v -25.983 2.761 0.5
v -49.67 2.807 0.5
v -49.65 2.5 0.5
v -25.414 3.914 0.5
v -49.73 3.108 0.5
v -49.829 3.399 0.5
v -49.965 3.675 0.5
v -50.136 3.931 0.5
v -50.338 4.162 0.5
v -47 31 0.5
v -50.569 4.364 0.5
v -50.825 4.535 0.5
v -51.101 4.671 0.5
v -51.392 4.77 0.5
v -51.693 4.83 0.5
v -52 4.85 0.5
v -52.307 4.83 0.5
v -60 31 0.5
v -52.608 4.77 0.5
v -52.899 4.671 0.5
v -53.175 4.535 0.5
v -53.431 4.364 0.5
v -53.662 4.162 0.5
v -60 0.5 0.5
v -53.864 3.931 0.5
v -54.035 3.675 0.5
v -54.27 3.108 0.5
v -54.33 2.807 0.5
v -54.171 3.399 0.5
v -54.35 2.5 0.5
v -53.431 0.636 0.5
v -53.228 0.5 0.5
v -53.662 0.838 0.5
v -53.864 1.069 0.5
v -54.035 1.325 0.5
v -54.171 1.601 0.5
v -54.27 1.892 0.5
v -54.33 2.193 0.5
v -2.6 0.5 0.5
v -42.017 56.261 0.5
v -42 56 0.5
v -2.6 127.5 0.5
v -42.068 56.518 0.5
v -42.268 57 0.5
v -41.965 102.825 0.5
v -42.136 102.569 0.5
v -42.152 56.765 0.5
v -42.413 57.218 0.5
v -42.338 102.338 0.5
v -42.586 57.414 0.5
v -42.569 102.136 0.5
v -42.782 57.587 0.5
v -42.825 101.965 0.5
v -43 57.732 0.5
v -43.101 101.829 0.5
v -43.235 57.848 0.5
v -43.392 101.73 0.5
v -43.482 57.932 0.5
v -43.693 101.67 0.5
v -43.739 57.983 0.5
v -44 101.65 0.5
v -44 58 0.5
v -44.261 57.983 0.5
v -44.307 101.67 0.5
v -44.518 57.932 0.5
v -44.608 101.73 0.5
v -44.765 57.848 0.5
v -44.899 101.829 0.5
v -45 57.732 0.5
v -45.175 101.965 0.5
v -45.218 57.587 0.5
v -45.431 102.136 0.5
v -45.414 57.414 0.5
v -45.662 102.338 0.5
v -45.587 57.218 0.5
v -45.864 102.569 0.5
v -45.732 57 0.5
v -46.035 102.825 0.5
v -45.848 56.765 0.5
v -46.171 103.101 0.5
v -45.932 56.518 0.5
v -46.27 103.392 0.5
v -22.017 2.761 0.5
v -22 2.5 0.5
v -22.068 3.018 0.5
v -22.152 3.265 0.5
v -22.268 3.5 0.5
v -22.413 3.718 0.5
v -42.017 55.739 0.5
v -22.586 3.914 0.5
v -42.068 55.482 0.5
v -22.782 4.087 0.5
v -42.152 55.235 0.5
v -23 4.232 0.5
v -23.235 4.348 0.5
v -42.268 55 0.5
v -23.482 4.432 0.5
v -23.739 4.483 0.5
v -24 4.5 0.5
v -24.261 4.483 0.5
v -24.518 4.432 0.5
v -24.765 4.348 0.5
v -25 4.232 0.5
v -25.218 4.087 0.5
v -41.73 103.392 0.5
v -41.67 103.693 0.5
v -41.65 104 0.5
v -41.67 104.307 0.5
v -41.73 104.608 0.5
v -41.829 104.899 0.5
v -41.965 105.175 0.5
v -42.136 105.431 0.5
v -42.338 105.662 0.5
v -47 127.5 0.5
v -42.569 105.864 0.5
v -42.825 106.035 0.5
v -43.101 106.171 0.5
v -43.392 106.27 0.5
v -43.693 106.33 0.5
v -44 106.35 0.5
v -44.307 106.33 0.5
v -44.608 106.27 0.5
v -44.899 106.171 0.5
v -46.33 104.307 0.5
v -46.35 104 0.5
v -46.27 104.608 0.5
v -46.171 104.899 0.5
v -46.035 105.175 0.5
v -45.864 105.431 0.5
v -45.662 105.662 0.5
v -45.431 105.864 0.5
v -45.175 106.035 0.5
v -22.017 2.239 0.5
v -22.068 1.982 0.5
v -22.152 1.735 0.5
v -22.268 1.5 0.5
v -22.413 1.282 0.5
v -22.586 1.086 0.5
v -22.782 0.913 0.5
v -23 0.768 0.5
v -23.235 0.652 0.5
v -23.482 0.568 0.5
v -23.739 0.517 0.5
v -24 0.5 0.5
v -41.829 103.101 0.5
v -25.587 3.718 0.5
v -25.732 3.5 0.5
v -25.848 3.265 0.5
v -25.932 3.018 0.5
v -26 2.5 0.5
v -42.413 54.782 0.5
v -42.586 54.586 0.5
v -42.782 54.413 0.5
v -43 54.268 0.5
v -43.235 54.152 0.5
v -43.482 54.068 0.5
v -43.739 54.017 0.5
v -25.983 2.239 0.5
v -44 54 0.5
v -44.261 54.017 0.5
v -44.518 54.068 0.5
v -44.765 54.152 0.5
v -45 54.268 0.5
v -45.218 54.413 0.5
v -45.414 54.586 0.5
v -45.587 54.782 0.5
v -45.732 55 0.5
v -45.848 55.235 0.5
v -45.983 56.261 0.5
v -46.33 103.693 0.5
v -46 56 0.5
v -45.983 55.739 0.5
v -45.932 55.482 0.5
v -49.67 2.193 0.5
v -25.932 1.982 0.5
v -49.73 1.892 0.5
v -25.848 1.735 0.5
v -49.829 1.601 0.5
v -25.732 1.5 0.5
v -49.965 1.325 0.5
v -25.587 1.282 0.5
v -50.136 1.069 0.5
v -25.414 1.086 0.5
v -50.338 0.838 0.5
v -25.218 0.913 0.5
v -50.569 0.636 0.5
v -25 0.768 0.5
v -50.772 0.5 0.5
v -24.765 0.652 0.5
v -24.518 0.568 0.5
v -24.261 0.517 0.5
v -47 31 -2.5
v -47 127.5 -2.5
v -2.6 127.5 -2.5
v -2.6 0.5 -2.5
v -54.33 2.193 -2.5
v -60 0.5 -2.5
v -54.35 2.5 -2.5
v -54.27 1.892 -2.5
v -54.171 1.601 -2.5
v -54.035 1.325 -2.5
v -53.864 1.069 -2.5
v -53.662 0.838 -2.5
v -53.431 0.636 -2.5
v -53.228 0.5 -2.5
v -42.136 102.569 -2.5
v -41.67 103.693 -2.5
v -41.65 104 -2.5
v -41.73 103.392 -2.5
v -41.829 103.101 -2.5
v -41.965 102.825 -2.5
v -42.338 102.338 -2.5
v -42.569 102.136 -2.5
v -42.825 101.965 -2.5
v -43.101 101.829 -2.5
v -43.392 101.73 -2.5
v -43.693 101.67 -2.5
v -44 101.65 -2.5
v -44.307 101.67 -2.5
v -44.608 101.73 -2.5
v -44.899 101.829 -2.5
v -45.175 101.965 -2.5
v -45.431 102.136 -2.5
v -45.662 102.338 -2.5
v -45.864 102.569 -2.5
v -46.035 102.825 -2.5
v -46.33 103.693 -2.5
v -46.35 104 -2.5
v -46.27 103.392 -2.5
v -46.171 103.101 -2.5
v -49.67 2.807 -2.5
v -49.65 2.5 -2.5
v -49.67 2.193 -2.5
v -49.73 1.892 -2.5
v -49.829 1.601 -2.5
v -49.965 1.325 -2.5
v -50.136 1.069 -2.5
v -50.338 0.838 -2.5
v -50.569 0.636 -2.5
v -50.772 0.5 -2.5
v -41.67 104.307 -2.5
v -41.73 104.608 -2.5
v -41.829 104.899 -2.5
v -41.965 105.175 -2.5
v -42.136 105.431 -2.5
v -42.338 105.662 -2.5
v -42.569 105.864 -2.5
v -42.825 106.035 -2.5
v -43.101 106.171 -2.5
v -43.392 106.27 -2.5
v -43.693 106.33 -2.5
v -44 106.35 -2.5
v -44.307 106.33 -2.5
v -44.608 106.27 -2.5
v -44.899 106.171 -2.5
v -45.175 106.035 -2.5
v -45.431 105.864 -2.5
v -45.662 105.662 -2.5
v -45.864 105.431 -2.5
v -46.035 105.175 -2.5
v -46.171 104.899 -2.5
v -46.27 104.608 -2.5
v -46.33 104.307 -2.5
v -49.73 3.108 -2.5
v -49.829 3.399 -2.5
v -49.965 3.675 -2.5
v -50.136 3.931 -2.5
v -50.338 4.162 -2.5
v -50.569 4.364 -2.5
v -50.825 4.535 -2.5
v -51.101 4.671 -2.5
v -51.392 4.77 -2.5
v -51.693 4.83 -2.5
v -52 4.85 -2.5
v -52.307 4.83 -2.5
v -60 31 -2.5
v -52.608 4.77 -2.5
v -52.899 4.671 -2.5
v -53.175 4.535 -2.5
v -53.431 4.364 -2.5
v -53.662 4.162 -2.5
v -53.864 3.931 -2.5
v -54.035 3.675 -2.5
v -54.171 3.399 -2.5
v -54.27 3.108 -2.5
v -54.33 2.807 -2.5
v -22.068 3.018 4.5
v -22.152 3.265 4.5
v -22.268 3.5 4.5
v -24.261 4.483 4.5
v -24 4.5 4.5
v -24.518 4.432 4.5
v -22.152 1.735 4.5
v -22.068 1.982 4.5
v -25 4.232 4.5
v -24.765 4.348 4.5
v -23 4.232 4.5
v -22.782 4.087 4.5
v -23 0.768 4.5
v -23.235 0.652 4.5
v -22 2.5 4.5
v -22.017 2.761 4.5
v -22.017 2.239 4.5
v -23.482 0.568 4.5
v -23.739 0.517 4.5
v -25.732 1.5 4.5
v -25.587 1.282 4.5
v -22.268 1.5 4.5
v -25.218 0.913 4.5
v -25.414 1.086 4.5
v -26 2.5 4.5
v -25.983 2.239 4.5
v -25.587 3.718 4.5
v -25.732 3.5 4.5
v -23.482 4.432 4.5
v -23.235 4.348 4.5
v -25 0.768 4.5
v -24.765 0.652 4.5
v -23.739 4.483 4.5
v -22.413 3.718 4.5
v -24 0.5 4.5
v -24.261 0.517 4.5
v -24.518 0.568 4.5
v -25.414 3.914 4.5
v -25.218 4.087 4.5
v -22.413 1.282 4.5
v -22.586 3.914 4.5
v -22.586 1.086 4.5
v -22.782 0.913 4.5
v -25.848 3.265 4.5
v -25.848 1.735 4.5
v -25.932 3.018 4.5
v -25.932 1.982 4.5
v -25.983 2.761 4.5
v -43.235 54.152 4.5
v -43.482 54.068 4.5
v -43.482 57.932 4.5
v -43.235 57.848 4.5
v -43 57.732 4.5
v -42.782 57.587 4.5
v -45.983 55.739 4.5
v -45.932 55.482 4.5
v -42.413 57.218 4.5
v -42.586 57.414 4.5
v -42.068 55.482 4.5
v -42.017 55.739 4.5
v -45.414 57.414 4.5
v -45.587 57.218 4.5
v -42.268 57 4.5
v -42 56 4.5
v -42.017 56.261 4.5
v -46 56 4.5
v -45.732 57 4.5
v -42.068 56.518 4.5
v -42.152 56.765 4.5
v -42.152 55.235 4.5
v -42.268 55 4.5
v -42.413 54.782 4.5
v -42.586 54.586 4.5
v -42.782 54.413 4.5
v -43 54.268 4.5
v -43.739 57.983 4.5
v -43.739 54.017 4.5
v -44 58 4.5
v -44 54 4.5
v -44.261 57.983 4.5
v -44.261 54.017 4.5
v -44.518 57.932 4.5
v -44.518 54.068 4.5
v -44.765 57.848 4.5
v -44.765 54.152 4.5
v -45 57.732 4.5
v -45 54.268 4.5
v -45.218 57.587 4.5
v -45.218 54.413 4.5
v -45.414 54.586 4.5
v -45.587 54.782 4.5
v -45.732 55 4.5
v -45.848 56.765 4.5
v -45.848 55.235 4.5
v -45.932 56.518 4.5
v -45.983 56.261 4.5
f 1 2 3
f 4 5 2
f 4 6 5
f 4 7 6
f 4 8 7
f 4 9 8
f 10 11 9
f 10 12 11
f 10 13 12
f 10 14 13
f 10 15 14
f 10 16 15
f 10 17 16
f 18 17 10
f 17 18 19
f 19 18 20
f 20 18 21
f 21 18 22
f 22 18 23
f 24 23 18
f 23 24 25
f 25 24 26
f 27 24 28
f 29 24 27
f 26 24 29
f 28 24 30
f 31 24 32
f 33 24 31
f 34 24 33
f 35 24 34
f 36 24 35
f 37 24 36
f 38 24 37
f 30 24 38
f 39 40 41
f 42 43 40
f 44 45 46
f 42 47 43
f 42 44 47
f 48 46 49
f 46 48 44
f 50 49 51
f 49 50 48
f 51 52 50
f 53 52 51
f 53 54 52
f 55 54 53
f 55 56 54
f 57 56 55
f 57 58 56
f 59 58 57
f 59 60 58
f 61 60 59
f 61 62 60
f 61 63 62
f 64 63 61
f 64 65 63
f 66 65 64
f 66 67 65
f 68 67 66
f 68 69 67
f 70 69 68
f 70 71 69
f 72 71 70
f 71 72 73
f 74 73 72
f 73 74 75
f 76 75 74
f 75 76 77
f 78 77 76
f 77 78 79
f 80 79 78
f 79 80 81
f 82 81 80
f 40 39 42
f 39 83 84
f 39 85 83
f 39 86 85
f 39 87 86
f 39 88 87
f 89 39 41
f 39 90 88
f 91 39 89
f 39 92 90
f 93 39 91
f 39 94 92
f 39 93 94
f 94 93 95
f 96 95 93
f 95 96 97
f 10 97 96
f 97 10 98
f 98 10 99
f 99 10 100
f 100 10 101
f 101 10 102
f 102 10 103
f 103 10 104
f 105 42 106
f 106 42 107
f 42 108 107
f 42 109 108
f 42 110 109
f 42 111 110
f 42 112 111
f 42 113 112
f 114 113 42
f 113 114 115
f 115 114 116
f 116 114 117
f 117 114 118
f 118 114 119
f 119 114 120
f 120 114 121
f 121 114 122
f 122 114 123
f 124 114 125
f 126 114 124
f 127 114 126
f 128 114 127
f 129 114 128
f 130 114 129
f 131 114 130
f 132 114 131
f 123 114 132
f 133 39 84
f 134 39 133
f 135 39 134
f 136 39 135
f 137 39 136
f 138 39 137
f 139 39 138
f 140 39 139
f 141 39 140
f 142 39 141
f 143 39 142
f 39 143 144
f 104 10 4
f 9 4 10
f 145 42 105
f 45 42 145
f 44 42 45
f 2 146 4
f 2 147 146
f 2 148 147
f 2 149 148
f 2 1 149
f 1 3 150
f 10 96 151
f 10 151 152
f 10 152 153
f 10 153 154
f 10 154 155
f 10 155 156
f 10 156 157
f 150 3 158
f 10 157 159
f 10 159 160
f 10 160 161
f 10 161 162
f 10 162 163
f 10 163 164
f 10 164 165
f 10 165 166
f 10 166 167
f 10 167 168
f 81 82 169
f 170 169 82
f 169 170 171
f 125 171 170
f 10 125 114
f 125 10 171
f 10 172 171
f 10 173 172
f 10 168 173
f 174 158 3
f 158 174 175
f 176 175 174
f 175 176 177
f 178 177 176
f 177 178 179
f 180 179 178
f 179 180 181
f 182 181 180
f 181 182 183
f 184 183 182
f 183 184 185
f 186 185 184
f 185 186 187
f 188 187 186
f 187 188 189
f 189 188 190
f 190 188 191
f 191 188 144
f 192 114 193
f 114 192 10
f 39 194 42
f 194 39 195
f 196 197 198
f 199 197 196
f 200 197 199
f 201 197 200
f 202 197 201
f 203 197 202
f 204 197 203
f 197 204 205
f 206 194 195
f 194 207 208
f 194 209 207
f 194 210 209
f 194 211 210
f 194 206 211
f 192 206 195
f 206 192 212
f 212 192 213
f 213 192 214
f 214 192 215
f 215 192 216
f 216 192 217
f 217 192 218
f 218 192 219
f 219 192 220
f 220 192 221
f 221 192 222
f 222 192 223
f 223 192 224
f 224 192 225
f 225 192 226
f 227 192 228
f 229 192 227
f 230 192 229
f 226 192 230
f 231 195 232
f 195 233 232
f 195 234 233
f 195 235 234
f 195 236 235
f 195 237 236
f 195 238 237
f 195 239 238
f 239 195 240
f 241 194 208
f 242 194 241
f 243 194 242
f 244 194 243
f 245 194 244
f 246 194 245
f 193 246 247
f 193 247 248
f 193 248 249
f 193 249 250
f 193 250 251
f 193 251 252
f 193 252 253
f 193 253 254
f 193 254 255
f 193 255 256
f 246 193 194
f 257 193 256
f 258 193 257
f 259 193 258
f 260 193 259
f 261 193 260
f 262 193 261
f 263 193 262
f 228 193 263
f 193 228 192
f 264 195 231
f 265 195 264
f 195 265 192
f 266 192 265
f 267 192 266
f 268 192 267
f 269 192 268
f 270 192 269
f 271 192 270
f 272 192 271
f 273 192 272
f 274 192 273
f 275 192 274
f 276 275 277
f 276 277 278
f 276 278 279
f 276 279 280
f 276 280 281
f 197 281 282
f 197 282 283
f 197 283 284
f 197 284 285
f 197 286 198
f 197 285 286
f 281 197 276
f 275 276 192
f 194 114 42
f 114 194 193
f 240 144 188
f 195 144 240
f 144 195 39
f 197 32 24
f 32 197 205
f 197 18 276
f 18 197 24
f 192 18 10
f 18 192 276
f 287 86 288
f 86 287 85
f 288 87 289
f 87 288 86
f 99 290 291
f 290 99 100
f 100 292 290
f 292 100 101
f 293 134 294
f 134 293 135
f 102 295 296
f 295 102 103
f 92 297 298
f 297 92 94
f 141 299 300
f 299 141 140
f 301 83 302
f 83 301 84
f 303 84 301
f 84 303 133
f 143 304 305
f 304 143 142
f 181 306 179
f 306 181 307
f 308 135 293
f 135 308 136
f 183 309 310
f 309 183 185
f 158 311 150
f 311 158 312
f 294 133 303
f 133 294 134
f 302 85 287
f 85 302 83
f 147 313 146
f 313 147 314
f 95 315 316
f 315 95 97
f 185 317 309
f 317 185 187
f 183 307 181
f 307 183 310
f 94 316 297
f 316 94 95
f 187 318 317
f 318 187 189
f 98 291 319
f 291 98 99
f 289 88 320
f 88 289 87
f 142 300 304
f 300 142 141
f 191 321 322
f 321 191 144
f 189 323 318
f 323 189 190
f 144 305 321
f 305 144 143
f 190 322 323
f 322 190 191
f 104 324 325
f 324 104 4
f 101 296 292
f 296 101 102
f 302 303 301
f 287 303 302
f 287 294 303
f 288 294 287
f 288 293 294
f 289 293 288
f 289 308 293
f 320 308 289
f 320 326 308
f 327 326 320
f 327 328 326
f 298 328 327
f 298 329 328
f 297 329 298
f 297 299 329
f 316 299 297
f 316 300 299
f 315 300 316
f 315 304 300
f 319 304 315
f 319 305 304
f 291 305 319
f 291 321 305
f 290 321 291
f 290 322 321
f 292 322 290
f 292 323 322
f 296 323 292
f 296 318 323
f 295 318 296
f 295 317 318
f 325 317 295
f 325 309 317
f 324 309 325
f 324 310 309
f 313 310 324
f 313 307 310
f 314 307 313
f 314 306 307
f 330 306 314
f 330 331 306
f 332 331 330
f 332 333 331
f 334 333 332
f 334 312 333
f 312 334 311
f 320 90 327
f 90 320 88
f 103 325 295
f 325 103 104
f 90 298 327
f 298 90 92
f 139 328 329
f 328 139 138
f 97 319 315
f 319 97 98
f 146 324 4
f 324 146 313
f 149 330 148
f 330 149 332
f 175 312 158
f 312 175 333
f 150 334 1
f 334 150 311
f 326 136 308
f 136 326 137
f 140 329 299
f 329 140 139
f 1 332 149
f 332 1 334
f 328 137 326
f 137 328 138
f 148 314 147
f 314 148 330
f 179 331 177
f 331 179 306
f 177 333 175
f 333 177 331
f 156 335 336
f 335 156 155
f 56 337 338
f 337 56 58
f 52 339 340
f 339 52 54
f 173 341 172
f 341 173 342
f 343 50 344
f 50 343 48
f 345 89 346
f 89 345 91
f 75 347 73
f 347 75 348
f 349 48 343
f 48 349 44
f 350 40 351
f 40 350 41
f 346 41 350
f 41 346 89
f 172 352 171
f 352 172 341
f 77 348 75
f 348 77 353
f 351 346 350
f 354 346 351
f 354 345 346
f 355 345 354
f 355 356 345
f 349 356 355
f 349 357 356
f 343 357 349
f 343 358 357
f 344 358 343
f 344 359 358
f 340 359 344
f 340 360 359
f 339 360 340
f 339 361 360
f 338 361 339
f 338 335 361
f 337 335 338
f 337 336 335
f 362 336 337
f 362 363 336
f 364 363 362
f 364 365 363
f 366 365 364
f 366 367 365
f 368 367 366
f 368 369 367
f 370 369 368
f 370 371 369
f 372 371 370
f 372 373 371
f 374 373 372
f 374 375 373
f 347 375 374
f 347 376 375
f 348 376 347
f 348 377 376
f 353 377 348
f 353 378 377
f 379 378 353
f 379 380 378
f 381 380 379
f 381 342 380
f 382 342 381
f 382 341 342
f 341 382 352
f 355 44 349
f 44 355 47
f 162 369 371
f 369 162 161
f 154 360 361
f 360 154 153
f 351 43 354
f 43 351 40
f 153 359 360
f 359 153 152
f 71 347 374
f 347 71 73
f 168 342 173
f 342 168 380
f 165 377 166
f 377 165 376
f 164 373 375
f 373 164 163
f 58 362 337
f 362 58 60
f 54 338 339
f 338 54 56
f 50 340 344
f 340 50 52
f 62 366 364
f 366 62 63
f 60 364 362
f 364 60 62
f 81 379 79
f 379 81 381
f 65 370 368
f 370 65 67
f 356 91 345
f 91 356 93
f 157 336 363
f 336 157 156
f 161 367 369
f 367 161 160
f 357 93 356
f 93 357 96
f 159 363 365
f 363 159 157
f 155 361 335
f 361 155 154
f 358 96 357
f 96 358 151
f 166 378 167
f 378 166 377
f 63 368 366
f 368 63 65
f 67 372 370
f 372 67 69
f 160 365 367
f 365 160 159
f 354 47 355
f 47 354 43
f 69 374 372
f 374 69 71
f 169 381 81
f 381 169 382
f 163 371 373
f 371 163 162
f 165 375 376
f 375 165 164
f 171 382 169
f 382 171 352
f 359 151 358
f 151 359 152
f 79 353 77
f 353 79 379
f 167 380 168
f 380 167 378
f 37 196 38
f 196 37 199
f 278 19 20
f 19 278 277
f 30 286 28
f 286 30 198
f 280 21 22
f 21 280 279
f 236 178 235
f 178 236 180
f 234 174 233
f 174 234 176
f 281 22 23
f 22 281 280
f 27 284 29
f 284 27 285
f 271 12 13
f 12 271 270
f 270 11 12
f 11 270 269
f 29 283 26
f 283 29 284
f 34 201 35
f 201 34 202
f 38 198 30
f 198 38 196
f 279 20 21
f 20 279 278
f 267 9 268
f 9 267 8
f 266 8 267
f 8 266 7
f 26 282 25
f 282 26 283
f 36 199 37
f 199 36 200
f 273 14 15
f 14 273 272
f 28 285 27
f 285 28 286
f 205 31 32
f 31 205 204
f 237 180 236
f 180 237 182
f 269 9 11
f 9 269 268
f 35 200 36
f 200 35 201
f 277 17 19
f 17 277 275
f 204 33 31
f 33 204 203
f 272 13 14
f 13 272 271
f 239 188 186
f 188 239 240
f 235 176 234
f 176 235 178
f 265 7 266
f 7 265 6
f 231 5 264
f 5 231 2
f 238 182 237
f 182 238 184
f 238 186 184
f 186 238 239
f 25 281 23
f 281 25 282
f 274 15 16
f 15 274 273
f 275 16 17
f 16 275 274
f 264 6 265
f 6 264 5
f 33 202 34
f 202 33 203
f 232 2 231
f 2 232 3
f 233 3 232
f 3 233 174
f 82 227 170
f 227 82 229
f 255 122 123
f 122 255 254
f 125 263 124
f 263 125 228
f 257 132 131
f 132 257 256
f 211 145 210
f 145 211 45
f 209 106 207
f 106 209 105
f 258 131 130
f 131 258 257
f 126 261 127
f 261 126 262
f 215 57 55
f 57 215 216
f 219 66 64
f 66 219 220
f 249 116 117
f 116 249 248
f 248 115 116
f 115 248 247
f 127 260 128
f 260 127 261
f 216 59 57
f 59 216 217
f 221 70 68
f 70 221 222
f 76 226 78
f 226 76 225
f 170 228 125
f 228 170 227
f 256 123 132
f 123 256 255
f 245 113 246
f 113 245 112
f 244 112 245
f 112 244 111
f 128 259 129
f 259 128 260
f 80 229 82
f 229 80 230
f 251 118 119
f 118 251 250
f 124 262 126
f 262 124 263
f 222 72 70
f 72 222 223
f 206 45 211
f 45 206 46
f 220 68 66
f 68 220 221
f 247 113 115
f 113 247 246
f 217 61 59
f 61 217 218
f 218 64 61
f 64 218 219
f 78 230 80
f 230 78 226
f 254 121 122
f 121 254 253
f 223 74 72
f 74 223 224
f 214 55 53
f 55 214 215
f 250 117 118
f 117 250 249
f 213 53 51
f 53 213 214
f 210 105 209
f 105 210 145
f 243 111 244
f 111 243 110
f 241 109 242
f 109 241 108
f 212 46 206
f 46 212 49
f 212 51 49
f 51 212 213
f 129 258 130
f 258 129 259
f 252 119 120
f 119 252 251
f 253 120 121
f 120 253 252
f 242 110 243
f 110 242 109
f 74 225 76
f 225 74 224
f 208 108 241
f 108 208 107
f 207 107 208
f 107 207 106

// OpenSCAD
hinge_part = "side_left";
include <../direct_mount_enclosure.scad>;
